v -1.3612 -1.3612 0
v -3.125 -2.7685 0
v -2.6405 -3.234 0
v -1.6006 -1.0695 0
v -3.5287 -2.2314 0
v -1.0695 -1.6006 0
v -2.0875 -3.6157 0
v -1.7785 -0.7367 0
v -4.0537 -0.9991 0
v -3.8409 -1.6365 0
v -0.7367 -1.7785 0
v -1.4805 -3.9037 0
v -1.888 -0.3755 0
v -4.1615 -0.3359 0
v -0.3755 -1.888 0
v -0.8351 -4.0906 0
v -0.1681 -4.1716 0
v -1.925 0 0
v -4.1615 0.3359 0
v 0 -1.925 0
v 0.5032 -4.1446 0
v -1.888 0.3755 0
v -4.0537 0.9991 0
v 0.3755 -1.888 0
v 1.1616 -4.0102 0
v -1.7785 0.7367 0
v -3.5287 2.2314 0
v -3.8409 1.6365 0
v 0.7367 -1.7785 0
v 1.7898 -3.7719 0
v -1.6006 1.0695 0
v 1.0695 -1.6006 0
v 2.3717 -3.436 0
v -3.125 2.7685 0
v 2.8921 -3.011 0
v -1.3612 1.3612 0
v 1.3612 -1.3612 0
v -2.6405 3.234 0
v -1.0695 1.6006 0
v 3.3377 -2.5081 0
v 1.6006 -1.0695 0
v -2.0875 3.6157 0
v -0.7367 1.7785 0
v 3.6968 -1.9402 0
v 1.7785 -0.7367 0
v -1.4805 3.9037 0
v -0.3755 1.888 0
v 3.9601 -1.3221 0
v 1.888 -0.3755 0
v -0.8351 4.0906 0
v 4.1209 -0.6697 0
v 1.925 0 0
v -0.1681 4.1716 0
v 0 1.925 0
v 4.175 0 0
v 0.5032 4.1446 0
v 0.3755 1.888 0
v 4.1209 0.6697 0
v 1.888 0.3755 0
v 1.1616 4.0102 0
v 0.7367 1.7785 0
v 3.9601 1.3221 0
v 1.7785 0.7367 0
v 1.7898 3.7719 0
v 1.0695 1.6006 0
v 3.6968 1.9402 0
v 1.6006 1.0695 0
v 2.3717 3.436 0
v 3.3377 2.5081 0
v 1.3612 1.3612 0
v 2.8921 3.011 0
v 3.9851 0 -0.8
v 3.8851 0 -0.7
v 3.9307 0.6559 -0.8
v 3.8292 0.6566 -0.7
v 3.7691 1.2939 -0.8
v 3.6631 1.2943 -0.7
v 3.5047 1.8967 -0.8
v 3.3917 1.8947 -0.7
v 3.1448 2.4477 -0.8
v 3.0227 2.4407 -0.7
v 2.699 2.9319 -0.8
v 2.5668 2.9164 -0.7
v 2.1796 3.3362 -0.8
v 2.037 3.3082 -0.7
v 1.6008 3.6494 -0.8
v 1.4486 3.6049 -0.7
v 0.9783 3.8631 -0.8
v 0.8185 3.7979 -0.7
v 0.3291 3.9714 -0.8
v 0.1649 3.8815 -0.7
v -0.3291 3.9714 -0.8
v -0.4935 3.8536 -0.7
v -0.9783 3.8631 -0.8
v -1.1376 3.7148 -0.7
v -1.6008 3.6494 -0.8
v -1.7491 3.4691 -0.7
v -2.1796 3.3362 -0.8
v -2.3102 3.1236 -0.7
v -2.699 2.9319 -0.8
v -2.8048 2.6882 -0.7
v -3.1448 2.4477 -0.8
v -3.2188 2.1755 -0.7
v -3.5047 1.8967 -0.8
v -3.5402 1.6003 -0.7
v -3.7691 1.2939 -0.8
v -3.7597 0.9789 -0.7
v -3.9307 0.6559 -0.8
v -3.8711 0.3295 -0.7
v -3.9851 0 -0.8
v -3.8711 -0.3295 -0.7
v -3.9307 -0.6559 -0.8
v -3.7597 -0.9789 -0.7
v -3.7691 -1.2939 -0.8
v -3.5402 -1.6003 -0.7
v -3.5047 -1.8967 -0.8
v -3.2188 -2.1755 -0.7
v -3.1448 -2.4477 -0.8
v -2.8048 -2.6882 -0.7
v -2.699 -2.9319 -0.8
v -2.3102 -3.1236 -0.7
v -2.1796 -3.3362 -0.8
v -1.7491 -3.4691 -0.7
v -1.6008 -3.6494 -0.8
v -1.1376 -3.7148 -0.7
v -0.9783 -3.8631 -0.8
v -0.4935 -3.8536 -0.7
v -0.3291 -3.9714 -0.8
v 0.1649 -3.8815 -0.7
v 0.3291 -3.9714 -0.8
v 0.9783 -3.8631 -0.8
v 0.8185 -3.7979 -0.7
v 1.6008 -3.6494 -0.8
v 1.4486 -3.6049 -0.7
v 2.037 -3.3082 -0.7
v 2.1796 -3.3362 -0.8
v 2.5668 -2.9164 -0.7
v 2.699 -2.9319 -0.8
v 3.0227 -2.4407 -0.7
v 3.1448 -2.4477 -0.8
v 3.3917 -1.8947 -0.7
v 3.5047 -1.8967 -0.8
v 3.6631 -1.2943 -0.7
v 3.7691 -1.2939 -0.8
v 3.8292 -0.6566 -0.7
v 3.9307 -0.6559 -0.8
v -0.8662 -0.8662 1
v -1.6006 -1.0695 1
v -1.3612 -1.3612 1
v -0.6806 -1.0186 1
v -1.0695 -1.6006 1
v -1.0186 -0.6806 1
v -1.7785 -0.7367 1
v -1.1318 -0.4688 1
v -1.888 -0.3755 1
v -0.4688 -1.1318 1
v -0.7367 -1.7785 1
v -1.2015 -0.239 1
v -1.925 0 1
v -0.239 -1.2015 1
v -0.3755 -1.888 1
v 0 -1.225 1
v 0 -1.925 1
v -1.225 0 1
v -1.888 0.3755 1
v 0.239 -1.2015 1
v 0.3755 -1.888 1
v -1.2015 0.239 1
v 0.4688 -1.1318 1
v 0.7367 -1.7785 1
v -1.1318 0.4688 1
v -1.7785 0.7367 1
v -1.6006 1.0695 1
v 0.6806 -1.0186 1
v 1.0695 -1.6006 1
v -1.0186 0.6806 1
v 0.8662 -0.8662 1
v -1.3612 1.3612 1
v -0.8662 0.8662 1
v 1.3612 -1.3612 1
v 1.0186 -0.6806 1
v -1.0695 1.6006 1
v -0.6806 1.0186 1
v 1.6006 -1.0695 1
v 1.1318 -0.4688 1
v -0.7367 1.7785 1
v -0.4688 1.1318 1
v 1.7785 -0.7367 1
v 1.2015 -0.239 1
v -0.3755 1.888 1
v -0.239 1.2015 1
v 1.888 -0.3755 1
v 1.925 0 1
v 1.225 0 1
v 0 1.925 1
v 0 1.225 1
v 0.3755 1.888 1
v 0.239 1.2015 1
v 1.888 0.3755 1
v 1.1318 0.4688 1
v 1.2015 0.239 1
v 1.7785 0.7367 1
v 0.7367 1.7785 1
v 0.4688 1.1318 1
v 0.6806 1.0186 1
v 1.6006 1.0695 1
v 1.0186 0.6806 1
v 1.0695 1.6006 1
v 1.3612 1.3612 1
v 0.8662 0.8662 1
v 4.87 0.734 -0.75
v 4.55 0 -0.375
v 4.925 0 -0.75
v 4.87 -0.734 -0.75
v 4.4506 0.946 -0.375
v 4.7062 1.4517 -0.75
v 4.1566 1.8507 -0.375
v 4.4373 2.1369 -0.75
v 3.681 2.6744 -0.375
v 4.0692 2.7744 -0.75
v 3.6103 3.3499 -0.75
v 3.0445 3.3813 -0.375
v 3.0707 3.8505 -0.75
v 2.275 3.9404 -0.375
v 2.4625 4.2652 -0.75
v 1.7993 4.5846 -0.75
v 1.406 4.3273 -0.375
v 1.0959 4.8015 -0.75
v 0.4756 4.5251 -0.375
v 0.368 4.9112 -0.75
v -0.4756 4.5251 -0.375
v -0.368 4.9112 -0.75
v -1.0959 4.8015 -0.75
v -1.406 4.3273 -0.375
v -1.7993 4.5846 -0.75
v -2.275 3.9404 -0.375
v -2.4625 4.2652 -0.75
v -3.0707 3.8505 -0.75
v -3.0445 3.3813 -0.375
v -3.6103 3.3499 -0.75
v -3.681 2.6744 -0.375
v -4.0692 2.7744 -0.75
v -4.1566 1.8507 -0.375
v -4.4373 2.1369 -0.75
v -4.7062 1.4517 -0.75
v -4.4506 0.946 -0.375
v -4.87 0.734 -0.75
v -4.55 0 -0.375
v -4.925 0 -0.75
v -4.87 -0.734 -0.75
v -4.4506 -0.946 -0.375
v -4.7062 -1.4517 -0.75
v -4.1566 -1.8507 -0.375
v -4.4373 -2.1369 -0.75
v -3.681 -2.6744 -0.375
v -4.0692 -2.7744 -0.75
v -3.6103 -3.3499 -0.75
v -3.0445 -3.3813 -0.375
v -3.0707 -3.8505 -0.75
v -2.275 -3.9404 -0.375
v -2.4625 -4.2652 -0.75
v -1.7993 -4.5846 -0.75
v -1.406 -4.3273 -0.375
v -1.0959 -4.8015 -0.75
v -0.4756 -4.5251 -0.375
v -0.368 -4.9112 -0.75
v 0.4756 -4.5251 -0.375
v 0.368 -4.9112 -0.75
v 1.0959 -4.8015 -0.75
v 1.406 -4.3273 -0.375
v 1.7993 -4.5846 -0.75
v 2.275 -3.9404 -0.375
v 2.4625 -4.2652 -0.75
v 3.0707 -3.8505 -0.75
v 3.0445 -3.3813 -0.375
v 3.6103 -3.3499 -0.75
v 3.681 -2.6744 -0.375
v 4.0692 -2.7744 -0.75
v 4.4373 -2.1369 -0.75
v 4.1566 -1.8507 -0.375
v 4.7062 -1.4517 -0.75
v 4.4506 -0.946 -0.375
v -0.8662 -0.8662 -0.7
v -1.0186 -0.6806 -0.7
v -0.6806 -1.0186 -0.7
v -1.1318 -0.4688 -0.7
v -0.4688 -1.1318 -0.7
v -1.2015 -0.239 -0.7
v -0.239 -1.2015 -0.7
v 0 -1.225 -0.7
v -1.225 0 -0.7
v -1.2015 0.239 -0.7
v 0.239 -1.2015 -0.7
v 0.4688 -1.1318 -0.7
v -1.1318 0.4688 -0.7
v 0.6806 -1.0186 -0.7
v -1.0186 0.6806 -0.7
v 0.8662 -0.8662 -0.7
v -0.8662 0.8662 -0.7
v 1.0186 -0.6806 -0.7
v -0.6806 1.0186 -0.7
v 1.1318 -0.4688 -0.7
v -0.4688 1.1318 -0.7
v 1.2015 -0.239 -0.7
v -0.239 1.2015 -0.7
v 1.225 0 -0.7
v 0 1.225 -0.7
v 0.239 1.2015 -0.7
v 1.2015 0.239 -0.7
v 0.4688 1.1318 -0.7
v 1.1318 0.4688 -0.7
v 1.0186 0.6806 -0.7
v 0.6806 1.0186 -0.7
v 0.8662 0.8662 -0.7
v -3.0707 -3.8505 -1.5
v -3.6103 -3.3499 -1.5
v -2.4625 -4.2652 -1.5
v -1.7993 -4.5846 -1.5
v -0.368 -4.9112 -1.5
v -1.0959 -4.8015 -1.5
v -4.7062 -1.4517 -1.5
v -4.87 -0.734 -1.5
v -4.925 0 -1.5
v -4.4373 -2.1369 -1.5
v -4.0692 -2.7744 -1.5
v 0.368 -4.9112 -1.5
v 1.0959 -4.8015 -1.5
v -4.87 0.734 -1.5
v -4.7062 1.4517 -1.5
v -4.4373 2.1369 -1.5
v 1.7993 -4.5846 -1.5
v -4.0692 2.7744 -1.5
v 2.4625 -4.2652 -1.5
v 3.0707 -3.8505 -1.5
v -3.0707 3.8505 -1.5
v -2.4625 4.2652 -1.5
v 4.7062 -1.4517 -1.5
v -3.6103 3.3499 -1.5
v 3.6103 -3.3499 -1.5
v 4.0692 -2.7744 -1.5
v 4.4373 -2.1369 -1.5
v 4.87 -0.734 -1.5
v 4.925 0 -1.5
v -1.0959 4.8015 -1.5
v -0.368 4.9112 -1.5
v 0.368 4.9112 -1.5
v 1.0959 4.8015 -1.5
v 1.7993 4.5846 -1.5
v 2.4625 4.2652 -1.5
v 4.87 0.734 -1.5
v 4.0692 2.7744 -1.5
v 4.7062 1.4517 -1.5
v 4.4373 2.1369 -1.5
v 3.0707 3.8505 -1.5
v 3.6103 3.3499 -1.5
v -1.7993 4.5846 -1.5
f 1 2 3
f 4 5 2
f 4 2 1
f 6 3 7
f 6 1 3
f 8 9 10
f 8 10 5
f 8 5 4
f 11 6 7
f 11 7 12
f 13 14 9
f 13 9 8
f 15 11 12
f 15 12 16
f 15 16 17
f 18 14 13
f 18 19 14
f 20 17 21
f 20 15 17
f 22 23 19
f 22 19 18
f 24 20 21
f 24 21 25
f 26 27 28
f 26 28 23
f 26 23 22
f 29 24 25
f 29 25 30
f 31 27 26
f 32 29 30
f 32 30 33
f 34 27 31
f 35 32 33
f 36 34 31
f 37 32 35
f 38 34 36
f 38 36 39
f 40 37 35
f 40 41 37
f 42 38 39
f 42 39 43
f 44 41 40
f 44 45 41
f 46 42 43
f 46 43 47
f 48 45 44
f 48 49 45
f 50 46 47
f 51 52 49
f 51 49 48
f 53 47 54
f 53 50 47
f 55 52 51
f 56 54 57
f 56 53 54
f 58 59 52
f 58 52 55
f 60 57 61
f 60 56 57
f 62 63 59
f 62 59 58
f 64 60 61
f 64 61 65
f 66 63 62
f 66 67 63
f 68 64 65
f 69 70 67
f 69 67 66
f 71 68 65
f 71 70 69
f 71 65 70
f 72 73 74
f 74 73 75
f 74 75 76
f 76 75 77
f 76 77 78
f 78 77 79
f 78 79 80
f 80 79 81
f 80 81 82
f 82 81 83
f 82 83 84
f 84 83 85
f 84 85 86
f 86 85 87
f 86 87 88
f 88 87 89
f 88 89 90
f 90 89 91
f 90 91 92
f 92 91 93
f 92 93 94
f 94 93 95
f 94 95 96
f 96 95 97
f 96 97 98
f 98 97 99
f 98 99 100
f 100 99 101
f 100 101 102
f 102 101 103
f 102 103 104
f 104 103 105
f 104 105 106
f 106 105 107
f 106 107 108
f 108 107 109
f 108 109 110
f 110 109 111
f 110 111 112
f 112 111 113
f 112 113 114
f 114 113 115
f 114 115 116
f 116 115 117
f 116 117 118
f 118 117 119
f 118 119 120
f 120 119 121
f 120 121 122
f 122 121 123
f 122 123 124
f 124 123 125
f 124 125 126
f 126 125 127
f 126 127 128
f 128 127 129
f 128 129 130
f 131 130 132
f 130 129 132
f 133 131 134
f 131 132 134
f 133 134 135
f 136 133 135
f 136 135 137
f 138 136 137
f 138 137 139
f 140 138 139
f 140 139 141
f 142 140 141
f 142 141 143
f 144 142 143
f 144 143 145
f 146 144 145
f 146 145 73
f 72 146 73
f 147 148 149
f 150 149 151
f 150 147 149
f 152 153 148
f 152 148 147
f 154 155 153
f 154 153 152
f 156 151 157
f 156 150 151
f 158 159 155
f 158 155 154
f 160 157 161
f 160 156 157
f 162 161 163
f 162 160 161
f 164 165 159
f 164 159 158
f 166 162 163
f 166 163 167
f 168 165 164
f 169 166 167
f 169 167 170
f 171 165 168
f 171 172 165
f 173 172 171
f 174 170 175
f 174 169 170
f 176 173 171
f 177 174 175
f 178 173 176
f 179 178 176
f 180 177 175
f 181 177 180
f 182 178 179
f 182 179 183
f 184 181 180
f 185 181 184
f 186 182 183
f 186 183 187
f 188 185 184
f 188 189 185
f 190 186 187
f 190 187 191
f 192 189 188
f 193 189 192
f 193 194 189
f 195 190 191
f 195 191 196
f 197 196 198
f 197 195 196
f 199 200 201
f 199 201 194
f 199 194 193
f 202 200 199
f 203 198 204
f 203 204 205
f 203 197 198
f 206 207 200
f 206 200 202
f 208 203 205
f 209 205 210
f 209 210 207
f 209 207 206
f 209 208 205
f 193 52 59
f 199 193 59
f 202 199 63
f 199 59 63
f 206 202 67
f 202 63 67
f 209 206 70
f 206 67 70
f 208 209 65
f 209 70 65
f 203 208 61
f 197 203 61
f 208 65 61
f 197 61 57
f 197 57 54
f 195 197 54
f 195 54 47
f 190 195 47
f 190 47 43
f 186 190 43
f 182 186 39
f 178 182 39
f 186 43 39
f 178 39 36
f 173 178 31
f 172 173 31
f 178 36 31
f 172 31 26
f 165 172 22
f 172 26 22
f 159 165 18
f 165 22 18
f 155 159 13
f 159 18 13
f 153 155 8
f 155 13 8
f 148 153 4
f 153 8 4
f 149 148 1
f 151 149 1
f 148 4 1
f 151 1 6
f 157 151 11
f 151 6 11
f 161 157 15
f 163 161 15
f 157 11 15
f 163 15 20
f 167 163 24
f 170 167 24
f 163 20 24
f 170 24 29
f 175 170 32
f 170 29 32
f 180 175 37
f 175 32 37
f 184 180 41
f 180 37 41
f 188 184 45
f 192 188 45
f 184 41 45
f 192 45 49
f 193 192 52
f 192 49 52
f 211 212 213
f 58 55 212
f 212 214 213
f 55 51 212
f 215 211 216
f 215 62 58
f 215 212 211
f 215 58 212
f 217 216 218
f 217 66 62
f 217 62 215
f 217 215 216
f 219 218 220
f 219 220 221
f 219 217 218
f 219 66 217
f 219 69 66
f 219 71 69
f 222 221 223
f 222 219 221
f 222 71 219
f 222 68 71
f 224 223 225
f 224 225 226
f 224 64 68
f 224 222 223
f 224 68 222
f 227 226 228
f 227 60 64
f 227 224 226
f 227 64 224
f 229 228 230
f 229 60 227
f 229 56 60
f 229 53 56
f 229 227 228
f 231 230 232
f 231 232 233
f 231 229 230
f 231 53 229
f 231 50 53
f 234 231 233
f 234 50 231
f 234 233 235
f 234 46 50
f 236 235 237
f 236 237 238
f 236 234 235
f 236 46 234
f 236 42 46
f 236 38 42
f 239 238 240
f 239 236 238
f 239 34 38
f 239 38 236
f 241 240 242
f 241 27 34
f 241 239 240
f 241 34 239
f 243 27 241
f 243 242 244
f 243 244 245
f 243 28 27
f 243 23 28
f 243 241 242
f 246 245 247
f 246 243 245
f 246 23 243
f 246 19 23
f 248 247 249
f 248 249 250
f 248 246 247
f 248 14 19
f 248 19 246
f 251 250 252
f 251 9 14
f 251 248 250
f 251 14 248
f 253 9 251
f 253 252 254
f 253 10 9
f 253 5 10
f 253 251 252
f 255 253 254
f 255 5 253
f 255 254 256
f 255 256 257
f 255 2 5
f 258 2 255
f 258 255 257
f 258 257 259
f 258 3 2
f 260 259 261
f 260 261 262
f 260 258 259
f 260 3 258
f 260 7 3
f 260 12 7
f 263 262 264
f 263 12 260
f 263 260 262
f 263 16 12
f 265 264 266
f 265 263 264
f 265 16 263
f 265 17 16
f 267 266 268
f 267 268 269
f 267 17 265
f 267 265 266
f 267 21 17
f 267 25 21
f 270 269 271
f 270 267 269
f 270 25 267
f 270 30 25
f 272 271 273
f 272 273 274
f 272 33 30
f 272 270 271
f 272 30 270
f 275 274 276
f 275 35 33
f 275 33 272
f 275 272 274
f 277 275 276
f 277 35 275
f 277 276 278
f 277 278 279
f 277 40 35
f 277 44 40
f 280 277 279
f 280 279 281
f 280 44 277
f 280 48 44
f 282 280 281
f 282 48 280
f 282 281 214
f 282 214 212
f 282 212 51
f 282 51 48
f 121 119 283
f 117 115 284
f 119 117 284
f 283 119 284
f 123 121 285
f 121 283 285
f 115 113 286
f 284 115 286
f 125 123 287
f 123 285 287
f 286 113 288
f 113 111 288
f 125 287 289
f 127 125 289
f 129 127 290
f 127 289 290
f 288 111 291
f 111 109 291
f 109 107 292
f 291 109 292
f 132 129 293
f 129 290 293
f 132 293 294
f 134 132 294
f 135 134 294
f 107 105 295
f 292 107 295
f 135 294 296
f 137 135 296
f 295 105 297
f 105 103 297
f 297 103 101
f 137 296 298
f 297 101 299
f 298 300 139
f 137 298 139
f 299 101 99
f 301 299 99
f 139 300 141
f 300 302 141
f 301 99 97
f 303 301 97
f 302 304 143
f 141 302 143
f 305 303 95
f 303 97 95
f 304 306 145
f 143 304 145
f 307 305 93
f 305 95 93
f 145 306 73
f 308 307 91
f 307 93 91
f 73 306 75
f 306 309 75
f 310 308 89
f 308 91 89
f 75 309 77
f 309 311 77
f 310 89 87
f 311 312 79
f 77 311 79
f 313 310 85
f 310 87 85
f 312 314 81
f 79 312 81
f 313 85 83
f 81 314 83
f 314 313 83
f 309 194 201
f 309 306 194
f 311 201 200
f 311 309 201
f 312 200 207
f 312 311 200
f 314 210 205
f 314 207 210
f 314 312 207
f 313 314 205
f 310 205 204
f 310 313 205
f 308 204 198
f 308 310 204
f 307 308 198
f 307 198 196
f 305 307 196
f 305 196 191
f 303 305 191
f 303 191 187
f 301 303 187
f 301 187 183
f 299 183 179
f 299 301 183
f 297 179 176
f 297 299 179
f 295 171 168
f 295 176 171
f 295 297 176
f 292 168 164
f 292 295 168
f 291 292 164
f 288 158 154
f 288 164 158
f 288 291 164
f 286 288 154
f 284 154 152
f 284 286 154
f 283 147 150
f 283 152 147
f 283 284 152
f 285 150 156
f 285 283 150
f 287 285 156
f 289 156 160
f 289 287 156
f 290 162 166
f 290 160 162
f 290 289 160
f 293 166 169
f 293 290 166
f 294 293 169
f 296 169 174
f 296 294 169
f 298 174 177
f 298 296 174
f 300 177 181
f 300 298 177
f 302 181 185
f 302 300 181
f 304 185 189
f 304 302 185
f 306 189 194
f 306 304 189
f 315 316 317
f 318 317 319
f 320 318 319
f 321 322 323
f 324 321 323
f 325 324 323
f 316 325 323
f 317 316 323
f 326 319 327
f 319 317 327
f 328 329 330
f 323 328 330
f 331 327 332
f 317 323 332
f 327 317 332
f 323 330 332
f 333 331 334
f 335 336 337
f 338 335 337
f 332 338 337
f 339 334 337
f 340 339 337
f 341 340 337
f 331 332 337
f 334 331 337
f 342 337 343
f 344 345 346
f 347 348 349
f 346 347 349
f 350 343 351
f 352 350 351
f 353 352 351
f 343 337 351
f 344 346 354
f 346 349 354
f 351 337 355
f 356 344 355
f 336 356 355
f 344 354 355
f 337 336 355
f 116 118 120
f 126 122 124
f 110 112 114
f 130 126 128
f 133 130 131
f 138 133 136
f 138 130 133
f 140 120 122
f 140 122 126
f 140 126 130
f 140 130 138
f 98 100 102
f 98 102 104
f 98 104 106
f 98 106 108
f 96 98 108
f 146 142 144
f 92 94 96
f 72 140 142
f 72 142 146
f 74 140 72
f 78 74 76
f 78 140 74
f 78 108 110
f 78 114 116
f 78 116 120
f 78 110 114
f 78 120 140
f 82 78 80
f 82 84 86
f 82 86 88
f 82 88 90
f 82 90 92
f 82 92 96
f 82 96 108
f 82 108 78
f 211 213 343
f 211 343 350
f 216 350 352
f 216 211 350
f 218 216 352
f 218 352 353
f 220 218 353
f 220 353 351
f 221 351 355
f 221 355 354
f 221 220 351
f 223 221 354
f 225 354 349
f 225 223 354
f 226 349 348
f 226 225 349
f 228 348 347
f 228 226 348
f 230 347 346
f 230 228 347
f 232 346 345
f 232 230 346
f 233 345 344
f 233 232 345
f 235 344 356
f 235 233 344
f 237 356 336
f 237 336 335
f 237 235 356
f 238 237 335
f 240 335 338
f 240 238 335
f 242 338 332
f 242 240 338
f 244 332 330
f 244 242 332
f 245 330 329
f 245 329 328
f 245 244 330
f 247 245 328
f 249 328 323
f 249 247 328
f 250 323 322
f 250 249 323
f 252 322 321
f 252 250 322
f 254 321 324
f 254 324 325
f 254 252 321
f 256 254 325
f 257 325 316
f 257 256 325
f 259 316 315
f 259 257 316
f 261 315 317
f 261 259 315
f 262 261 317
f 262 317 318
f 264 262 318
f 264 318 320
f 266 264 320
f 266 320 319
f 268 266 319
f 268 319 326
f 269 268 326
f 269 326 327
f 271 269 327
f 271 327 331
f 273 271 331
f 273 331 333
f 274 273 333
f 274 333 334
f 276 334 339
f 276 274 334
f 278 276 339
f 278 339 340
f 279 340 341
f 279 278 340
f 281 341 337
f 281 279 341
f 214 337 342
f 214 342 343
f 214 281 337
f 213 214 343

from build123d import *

# Parameters (mm, degrees)
F0_R     = 1.925
F1_DEPTH = 1
F0_R_2   = 4.925
F2_DEPTH = 1.5
F3_SIZE  = 0.75
F4_T     = -0.7


with BuildPart() as f1:
    # F0 (on Top) → F1 (new body)
    with BuildSketch(Plane.XY):
        Circle(F0_R)
    extrude(amount=F1_DEPTH)

    # F0 (on Top) → F2 (join)
    with BuildSketch(Plane.XY):
        Circle(F0_R_2)
        Circle(F0_R, mode=Mode.SUBTRACT)
        Circle(F0_R)
    extrude(amount=-F2_DEPTH)

    # F3
    f3_edges = [f1.edges().sort_by_distance(p)[0] for p in [
        (-4.925, 0, 0),
    ]]
    chamfer(f3_edges, length=F3_SIZE)

    # F4
    f4_openings = [f1.faces().sort_by_distance(p)[0] for p in [
        (0, 0, 1),
    ]]
    offset(amount=F4_T, openings=f4_openings, kind=Kind.INTERSECTION)


solid = f1.part
